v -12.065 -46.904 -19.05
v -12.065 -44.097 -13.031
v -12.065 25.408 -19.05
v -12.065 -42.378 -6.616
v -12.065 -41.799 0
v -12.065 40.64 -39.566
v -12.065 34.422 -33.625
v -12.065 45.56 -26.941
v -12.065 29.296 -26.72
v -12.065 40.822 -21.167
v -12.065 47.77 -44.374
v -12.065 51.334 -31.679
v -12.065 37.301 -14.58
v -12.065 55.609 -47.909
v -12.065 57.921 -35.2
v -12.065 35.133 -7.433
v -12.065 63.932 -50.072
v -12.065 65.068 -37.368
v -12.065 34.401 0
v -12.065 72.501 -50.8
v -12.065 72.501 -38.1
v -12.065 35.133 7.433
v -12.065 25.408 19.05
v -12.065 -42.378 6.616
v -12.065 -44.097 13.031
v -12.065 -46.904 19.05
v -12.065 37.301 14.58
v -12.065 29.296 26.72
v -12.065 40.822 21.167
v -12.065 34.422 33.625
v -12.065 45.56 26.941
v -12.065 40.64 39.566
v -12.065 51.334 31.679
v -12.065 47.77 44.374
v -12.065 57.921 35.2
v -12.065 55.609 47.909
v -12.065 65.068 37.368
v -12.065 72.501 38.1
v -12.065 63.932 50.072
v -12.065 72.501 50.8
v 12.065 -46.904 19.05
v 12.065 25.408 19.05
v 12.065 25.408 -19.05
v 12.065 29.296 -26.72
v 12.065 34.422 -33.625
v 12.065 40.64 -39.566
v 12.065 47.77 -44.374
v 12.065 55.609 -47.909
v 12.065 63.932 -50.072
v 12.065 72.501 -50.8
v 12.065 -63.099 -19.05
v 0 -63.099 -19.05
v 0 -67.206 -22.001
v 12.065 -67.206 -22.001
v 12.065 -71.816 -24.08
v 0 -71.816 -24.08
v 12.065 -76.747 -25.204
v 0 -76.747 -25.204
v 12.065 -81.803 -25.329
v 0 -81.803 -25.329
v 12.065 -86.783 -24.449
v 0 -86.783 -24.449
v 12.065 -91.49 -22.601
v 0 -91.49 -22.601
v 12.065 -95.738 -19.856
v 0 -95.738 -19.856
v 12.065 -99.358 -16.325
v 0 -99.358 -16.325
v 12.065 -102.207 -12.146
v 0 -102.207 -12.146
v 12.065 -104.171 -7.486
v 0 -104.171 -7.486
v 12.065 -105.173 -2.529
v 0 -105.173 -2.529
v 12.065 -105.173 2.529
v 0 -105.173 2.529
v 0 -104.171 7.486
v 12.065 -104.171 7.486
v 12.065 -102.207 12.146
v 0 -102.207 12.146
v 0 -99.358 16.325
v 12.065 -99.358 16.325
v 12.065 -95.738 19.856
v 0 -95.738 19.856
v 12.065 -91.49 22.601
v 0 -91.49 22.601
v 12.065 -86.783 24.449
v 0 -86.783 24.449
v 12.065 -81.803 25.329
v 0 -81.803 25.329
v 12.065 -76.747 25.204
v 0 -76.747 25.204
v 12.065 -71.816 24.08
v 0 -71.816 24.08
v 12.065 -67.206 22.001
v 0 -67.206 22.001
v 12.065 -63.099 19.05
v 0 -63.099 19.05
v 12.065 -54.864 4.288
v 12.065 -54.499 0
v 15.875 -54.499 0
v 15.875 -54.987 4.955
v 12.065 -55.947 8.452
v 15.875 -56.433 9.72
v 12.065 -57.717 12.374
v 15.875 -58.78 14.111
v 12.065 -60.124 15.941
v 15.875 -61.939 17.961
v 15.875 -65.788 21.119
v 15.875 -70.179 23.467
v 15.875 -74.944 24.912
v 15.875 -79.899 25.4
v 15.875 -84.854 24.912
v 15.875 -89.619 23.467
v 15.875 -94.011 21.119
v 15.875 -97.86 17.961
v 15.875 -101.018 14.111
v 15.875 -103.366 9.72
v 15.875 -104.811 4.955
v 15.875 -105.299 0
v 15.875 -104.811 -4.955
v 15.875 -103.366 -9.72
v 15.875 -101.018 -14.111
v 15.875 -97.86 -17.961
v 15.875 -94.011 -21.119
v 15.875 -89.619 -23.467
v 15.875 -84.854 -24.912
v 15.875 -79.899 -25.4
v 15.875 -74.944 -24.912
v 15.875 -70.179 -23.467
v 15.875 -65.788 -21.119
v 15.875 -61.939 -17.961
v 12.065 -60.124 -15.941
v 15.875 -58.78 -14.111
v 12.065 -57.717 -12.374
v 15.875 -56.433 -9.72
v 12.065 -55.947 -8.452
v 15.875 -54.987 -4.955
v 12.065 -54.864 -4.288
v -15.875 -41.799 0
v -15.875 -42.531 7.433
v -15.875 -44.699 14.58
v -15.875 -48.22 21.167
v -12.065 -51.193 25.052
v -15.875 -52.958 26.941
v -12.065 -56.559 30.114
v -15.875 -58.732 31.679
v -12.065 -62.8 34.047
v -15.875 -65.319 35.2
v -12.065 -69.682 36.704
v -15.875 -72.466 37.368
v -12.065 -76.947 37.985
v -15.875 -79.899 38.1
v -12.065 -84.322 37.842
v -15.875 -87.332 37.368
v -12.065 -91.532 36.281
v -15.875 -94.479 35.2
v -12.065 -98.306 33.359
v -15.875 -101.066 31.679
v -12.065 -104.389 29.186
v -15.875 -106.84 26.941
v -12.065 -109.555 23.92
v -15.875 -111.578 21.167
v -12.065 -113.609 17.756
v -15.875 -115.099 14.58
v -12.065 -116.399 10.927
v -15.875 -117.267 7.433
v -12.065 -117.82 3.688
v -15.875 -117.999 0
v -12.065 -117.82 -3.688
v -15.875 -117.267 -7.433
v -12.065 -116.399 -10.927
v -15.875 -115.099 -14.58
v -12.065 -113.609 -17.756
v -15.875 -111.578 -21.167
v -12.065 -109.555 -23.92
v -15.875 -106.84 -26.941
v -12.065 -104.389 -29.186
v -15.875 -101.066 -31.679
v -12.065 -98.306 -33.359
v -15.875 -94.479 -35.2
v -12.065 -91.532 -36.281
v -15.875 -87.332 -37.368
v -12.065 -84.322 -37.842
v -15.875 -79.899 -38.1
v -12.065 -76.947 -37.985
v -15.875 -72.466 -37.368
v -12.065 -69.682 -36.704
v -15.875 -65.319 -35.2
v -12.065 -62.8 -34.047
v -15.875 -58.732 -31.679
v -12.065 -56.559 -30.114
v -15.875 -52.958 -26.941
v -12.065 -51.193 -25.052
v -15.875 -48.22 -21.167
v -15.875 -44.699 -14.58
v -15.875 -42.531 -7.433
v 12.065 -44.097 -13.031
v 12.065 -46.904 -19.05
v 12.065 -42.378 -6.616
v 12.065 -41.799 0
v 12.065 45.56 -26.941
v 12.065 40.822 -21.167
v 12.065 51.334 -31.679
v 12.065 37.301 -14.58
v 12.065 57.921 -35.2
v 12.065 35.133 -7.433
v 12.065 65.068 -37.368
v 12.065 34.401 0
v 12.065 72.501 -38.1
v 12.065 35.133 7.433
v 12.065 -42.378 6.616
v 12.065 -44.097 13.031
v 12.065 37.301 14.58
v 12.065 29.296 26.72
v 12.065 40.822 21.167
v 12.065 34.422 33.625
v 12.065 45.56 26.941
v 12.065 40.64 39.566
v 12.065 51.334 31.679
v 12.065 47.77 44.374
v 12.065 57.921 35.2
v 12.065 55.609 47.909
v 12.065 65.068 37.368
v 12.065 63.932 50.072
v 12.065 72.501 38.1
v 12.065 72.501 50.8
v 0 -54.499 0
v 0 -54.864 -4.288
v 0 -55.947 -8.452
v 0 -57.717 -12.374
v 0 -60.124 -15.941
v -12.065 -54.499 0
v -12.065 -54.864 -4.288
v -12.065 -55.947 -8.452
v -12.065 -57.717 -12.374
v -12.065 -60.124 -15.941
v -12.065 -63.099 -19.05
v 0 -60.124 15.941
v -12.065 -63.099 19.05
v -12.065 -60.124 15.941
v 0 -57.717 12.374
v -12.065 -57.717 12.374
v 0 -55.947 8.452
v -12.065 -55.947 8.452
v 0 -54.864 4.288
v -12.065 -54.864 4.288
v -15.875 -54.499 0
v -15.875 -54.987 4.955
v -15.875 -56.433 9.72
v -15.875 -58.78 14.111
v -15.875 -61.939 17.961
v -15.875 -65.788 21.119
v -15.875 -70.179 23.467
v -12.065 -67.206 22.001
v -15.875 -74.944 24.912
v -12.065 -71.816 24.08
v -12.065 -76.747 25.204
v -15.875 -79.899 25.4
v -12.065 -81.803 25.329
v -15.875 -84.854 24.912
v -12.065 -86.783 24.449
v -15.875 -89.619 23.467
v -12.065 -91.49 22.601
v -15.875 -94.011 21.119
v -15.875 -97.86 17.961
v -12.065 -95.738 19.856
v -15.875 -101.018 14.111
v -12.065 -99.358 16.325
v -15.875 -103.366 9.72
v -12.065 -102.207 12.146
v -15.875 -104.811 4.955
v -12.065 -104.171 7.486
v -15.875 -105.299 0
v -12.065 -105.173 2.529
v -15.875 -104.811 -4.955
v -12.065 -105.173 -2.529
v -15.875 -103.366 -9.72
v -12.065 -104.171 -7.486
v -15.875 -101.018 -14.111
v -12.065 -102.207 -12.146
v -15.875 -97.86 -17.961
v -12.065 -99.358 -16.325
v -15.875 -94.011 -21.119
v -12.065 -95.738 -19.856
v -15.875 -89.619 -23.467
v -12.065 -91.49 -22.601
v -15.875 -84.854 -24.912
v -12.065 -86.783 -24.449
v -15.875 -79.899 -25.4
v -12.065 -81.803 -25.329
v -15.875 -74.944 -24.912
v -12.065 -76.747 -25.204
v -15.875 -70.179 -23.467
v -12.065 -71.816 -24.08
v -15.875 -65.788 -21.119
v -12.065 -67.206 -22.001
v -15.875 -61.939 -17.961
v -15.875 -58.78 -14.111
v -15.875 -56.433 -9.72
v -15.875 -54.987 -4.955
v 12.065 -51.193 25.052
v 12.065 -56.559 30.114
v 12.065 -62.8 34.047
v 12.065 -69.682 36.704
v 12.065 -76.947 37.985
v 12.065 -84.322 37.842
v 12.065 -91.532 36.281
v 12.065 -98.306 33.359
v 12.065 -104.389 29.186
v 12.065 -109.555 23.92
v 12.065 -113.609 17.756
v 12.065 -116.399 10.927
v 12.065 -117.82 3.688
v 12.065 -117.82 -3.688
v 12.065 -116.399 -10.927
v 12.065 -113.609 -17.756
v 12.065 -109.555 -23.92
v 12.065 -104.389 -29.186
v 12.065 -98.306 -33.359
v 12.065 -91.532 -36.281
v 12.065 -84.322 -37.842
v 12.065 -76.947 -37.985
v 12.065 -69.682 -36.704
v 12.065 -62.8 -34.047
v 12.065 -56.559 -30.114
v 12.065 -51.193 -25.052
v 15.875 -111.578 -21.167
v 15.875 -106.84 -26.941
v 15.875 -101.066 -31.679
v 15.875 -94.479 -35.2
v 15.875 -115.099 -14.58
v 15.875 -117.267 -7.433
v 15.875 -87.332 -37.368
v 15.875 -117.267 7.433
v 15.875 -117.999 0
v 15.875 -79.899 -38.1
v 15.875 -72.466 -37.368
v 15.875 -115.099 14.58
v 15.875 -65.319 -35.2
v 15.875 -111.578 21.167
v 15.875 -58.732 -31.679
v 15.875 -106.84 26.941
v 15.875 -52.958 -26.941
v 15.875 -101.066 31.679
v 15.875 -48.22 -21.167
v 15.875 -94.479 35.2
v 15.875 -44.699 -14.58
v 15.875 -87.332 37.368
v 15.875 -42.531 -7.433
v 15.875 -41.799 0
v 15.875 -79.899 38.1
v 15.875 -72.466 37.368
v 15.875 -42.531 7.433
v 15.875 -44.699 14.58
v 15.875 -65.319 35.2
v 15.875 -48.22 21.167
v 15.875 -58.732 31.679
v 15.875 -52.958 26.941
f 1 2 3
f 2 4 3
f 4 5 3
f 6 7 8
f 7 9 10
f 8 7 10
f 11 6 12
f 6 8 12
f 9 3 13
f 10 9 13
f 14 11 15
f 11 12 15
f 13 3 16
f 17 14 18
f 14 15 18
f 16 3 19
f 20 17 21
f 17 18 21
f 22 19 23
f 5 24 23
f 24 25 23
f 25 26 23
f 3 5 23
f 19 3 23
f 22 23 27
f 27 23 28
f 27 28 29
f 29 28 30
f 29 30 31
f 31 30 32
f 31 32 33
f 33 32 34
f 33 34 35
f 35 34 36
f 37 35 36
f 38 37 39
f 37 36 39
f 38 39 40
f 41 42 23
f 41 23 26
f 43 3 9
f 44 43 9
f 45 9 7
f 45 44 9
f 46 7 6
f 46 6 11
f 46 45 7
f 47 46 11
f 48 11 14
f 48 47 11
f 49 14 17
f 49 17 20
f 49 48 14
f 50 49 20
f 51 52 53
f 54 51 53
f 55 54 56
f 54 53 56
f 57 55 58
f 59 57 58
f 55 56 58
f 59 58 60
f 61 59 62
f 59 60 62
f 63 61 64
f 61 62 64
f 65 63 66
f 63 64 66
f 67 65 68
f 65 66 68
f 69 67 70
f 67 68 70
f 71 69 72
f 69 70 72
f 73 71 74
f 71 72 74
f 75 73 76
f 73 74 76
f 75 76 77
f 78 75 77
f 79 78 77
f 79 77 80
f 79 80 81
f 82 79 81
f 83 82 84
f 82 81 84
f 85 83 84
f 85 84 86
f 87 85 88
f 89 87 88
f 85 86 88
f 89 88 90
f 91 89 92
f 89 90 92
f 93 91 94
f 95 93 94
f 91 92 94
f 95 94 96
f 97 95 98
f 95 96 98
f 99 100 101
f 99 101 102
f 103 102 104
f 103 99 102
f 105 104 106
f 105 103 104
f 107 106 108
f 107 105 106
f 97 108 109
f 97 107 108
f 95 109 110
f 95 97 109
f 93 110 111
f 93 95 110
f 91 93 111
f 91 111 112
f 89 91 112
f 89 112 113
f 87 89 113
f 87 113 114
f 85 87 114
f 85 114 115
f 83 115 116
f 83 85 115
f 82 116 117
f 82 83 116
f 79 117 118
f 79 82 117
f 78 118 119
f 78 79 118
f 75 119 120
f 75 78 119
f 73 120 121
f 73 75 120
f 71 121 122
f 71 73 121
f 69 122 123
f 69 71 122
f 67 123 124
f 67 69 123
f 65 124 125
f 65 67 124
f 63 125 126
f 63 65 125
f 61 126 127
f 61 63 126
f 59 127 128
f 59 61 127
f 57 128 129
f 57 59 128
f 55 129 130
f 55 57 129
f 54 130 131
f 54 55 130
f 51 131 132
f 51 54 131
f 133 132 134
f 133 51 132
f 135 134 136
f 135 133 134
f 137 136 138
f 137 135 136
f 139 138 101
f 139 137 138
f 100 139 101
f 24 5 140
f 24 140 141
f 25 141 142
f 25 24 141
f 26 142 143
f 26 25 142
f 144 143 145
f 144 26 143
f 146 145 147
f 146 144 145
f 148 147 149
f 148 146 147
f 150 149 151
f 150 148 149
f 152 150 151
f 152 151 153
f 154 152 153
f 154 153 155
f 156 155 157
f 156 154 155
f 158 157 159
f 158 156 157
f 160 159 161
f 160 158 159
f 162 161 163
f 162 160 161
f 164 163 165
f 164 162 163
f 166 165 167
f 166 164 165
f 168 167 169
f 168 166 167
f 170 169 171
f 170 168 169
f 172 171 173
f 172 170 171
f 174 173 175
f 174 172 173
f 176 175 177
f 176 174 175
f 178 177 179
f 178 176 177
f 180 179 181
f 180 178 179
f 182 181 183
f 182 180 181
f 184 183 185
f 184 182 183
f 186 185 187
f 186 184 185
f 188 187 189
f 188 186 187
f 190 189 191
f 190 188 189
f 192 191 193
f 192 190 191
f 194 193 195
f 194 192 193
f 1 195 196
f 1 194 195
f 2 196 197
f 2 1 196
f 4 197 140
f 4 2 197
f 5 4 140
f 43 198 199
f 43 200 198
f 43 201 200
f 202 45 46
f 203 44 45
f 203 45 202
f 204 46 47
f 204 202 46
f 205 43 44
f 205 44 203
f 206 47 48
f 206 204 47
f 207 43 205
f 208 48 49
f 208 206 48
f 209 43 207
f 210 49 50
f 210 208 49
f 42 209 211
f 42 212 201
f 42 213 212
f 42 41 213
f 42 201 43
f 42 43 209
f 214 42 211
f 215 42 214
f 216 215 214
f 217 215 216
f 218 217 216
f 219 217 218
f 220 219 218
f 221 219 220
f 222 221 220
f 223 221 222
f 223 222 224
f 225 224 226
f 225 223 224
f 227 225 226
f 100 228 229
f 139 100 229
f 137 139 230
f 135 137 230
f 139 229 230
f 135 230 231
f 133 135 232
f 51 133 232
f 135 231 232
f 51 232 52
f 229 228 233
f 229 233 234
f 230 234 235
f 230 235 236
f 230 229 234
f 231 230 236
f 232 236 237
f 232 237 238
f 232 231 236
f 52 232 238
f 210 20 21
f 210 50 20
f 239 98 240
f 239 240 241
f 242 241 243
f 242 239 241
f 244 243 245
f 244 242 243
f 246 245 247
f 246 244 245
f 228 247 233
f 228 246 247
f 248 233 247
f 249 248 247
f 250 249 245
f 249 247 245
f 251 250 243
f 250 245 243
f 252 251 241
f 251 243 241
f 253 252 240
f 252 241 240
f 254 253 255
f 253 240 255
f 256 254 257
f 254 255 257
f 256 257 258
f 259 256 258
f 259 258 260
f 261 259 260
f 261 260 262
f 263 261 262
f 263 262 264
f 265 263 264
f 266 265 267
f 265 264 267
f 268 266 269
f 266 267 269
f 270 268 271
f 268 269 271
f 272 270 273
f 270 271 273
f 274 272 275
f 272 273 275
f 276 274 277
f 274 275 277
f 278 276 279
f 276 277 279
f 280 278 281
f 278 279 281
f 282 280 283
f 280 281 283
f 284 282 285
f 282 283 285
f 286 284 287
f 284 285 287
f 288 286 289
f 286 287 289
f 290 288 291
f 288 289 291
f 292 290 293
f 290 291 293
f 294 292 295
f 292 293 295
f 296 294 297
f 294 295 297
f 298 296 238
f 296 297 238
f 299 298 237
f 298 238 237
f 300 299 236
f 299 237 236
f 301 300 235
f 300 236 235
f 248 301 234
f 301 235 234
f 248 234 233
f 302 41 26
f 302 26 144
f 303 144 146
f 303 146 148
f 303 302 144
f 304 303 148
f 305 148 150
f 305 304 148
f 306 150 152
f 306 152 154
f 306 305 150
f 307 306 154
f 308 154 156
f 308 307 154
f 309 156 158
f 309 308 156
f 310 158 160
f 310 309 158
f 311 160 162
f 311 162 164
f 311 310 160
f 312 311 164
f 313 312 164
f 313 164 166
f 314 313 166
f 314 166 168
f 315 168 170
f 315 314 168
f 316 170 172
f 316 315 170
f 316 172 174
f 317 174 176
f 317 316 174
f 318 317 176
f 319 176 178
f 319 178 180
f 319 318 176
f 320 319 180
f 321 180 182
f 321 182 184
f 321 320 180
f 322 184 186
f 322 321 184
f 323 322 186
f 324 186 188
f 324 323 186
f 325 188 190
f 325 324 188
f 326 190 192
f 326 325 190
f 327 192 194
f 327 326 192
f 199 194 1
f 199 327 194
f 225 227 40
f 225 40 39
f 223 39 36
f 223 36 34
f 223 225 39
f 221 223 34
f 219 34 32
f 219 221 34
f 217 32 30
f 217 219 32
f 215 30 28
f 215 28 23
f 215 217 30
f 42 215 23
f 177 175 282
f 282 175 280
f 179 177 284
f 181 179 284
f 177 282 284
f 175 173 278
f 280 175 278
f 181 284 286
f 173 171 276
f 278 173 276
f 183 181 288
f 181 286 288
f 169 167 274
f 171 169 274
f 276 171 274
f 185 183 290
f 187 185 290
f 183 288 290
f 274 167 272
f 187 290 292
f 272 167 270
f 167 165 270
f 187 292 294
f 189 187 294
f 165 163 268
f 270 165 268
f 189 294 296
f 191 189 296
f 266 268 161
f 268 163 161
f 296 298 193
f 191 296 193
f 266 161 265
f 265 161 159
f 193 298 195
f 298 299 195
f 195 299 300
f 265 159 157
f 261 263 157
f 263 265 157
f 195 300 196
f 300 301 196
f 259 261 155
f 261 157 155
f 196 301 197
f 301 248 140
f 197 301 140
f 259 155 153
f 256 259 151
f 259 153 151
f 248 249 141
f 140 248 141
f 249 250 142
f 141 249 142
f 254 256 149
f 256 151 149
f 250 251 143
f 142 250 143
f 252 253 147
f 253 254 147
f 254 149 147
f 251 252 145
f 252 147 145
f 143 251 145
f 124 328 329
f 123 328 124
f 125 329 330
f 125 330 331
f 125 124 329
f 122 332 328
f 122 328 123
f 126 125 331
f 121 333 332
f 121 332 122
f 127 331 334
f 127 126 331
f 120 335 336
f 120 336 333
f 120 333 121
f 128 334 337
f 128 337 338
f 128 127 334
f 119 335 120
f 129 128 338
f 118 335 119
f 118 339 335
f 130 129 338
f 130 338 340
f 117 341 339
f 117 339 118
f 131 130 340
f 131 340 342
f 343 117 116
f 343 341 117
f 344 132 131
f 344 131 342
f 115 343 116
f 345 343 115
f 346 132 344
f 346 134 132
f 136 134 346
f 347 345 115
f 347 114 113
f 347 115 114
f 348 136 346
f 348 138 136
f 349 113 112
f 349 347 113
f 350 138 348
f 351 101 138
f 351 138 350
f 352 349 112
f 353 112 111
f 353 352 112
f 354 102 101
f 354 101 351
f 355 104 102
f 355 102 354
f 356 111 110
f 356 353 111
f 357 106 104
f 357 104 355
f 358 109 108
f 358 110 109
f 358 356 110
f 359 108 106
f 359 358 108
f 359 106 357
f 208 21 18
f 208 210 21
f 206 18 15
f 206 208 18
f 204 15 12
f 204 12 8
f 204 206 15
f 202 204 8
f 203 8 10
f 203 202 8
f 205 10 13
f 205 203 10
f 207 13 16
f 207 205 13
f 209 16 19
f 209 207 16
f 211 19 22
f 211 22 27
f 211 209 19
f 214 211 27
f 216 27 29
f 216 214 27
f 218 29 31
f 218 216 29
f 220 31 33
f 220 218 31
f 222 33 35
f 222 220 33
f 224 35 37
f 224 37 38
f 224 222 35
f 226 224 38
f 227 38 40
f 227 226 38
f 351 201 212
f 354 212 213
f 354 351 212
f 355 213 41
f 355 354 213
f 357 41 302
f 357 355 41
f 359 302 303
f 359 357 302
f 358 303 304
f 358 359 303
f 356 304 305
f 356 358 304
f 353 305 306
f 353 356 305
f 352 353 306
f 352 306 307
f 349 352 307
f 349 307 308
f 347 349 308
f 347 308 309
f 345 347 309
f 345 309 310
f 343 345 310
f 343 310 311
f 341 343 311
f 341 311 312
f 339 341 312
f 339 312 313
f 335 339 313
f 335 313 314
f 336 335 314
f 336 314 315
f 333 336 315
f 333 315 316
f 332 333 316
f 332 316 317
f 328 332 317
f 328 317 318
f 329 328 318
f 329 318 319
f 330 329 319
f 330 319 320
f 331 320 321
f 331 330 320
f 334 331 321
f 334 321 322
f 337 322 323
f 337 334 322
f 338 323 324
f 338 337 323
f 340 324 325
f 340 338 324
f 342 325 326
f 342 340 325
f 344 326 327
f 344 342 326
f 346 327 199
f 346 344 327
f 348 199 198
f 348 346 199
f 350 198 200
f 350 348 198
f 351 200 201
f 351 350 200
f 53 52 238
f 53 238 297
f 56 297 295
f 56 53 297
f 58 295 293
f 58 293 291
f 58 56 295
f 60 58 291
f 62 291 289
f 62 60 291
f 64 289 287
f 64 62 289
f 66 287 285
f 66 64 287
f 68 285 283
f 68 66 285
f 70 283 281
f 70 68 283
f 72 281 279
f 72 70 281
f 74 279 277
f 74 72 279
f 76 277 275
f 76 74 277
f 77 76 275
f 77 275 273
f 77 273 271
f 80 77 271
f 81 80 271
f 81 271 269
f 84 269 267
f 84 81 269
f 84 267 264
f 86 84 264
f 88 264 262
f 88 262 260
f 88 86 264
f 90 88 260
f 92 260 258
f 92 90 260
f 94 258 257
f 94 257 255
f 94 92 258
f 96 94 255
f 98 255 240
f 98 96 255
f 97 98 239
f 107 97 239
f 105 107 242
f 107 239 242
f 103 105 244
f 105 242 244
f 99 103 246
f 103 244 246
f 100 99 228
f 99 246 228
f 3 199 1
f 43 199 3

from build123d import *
from build123d import SkipClean  # not in build123d's __all__

# Parameters (mm, degrees)
F1_DEPTH = 12.065
F2_R     = 38.1
F2_R_2   = 25.4
F3_DEPTH = 15.875


with BuildPart() as f1:
    # F0 (on Right) → F1 (new body, symmetric)
    with BuildSketch(Plane.YZ):
        with BuildLine():
            ThreePointArc((39.5052965482, -19.05), (34.4008644324, 0), (39.5052965482, 19.05))
            Line((39.5052965482, 19.05), (25.4080040394, 19.05))
            ThreePointArc((25.4080040394, 19.05), (21.7008644324, 0), (25.4080040394, -19.05))
            Line((25.4080040394, -19.05), (39.5052965482, -19.05))
        make_face()
        with BuildLine():
            Line((25.4080040394, 19.05), (39.5052965482, 19.05))
            ThreePointArc((39.5052965482, 19.05), (53.4508644324, 32.9955678842), (72.5008644324, 38.1))
            Line((72.5008644324, 38.1), (72.5008644324, 50.8))
            ThreePointArc((72.5008644324, 50.8), (44.1028011182, 42.1211348375), (25.4080040394, 19.05))
        make_face()
        with BuildLine():
            ThreePointArc((25.4080040394, -19.05), (21.7008644324, 0), (25.4080040394, 19.05))
            Line((25.4080040394, 19.05), (-46.9035676834, 19.05))
            ThreePointArc((-46.9035676834, 19.05), (-43.097361586, 9.8610056184), (-41.7991355676, 0))
            ThreePointArc((-41.7991355676, 0), (-43.097361586, -9.8610056184), (-46.9035676834, -19.05))
            Line((-46.9035676834, -19.05), (25.4080040394, -19.05))
        make_face()
        with BuildLine():
            ThreePointArc((72.5008644324, -38.1), (53.4508644324, -32.9955678842), (39.5052965482, -19.05))
            Line((39.5052965482, -19.05), (25.4080040394, -19.05))
            ThreePointArc((25.4080040394, -19.05), (44.1028011182, -42.1211348375), (72.5008644324, -50.8))
            Line((72.5008644324, -50.8), (72.5008644324, -38.1))
        make_face()
        with BuildLine():
            ThreePointArc((-41.7991355676, 0), (-43.097361586, 9.8610056184), (-46.9035676834, 19.05))
            Line((-46.9035676834, 19.05), (-63.0986147423, 19.05))
            ThreePointArc((-63.0986147423, 19.05), (-56.7486147423, 10.4505208253), (-54.4991355676, 0))
            ThreePointArc((-54.4991355676, 0), (-56.7486147423, -10.4505208253), (-63.0986147423, -19.05))
            Line((-63.0986147423, -19.05), (-46.9035676834, -19.05))
            ThreePointArc((-46.9035676834, -19.05), (-43.097361586, -9.8610056184), (-41.7991355676, 0))
        make_face()
        with BuildLine():
            Line((-63.0986147423, 19.05), (-46.9035676834, 19.05))
            ThreePointArc((-46.9035676834, 19.05), (-117.9991355676, 0), (-46.9035676834, -19.05))
            Line((-46.9035676834, -19.05), (-63.0986147423, -19.05))
            ThreePointArc((-63.0986147423, -19.05), (-105.2991355676, 0), (-63.0986147423, 19.05))
        make_face()
    extrude(amount=F1_DEPTH, both=True)

    # F2 (on Right) → F3 (join, symmetric)
    with BuildSketch(Plane.YZ):
        with Locations((-79.8991355676, 0)):
            Circle(F2_R)
        with Locations((-79.8991355676, 0)):
            Circle(F2_R_2, mode=Mode.SUBTRACT)
    with SkipClean():  # cleaning this boolean's faces spoils the solid; the shape is the same uncleaned
        extrude(amount=F3_DEPTH, both=True)


solid = f1.part
